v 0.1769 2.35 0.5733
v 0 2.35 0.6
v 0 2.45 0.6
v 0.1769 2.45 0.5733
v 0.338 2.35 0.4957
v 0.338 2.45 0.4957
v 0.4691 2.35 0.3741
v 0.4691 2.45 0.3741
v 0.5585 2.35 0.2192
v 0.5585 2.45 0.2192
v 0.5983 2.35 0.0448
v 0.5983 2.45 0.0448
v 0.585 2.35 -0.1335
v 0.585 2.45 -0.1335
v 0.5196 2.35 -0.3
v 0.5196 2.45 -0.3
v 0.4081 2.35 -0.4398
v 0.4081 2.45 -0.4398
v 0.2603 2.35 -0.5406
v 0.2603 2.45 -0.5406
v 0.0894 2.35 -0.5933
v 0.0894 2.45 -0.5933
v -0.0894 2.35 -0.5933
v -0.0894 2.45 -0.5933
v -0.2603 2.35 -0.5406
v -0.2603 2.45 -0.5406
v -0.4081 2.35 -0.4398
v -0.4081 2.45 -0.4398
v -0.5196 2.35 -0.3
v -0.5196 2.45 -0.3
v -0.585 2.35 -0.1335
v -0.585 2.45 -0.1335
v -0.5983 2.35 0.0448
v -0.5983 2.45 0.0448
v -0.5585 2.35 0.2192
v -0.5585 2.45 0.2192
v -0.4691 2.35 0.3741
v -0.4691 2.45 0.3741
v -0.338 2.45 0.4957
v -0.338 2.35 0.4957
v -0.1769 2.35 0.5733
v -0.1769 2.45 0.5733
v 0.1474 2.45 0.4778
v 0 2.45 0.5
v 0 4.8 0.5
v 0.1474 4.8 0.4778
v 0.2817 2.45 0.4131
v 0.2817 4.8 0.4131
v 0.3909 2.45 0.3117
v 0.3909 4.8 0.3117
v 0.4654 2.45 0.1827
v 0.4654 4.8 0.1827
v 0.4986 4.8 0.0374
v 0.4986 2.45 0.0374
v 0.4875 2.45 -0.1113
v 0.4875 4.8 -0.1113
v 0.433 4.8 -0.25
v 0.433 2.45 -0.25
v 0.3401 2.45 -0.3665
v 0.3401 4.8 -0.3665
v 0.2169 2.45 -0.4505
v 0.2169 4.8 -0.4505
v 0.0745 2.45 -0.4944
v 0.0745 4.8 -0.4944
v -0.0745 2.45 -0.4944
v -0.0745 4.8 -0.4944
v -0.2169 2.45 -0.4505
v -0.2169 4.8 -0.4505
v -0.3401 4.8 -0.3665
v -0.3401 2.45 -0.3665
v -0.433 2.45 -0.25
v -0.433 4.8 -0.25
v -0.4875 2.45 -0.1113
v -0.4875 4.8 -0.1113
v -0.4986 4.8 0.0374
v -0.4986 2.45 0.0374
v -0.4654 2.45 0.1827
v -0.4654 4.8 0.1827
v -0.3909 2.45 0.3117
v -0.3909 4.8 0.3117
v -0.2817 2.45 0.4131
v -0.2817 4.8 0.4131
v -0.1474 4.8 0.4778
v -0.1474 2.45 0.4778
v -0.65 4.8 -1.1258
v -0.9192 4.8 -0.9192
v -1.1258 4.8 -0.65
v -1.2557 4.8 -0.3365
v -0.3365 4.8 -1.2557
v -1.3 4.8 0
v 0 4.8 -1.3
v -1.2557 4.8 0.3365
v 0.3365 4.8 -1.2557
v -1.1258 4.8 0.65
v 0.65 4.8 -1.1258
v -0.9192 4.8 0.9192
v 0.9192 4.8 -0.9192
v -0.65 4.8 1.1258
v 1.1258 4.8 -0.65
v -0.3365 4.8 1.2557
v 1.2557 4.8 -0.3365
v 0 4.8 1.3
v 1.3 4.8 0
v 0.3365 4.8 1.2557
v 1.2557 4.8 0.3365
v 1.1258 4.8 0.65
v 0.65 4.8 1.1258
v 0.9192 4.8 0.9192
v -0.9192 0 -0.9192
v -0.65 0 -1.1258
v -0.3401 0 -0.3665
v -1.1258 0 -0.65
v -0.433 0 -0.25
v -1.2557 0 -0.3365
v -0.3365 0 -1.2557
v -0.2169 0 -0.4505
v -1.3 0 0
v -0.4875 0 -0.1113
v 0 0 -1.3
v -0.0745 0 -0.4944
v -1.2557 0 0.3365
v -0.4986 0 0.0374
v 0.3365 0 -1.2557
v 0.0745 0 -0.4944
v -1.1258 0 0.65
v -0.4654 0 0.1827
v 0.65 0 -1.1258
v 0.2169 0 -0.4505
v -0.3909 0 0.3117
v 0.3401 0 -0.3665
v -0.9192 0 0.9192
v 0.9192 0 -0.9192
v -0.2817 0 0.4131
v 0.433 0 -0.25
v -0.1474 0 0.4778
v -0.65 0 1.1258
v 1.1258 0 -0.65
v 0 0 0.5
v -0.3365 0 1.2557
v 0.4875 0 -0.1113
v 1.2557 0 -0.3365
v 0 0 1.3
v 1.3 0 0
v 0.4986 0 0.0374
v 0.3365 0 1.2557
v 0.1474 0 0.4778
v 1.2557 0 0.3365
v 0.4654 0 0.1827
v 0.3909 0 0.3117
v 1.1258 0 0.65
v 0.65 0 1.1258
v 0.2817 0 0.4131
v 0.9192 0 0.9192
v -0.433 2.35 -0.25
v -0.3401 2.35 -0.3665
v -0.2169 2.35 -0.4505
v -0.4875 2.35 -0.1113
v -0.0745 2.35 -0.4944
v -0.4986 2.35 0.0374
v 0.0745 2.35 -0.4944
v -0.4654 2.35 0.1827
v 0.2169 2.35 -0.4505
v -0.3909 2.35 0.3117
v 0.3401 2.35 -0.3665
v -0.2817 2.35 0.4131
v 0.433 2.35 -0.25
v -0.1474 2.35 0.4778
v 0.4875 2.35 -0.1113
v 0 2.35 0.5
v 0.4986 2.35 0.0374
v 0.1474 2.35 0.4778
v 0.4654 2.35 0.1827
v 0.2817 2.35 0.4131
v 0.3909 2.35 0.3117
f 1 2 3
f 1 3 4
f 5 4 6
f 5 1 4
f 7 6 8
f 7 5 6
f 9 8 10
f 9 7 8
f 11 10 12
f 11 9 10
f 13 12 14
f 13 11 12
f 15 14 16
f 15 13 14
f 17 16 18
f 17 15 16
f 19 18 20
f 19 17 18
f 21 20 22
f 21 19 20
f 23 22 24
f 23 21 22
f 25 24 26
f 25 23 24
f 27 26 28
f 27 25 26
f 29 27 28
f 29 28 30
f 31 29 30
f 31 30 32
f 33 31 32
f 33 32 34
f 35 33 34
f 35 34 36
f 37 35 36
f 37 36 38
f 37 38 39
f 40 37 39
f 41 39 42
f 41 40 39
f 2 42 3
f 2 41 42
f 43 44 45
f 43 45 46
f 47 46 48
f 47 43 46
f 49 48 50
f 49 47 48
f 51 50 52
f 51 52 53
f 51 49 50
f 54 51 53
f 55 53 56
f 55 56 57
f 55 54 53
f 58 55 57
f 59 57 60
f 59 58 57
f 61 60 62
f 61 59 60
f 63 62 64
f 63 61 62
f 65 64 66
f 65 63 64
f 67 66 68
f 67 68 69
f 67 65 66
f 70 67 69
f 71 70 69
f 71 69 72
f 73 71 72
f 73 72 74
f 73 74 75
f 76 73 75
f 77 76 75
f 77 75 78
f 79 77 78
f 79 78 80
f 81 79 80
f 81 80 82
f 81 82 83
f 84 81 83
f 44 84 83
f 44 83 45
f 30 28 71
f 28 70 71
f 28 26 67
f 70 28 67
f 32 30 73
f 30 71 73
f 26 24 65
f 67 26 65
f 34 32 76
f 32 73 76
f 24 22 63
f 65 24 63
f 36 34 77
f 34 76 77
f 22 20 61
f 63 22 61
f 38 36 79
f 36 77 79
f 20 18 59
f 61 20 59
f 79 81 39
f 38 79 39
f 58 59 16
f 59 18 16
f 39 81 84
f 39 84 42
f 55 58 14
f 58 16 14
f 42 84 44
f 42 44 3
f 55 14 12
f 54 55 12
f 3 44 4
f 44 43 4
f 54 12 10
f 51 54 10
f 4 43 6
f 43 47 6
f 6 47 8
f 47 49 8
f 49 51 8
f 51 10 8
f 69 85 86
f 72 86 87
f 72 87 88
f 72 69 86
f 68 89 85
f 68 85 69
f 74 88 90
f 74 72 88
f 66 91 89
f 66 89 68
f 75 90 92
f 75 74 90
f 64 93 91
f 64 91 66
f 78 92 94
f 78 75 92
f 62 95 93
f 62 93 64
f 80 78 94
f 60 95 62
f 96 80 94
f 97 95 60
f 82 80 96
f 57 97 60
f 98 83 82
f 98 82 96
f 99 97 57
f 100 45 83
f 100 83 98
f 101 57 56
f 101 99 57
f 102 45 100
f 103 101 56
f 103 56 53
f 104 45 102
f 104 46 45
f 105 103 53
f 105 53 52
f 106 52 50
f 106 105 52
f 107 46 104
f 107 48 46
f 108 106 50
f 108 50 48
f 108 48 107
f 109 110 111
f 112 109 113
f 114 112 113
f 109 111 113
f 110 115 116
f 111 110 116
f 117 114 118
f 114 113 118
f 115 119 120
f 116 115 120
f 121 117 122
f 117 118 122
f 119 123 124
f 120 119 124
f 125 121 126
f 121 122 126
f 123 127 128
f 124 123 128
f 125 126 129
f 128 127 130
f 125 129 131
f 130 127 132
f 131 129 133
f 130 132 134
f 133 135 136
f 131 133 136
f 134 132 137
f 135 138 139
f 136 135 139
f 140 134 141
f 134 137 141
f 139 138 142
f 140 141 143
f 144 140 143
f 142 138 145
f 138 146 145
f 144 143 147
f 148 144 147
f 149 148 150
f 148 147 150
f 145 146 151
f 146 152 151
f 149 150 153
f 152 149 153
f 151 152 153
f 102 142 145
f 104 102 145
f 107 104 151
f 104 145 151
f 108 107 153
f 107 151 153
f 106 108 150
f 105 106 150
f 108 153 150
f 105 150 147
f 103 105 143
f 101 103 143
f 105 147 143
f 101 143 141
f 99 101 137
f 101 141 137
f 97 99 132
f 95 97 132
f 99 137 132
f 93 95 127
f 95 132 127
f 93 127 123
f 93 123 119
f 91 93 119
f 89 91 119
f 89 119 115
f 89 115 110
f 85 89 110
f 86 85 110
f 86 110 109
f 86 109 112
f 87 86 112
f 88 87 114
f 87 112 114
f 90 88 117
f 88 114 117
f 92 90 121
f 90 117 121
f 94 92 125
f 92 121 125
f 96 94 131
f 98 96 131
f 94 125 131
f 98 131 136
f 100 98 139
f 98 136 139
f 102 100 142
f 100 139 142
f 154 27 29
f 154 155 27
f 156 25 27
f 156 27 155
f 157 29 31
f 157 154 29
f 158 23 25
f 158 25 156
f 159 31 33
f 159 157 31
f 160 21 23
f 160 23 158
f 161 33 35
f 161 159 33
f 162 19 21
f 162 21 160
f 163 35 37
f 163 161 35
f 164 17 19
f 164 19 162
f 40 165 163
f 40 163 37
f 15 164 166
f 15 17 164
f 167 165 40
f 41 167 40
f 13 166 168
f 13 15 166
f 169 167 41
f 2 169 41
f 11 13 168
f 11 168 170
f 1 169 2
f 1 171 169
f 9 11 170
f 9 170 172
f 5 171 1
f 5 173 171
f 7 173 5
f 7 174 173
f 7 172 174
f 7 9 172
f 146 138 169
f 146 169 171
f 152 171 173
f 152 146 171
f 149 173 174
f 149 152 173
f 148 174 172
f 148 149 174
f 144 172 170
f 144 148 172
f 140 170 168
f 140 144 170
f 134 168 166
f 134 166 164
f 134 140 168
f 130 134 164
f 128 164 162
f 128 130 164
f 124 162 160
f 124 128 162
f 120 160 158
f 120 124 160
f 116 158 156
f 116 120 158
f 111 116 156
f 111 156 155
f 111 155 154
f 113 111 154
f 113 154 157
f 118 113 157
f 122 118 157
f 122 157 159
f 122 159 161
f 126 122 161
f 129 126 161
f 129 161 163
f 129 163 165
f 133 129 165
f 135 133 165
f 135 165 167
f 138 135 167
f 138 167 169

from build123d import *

# Parameters (mm, degrees)
SKETCH2_R               = 1.3
SKETCH2_R_2             = 0.5
BOSS_EXTRUDE1_DEPTH     = 4.8
CUT_EXTRUDE1_DEPTH      = 0.05
CUT_EXTRUDE1_DEPTH_BACK = 0.05
SKETCH3_R               = 0.6
SKETCH3_R_2             = 0.5


with BuildPart() as part:
    # Sketch2 → Boss-Extrude1 (new body)
    with BuildSketch(Plane(origin=(0, 0, 0), x_dir=(1, 0, 0), z_dir=(0, 1, 0))):
        with Locations(Location((0, 0, 0), (0, 0, 270))):
            Circle(SKETCH2_R)
        with Locations(Location((0, 0, 0), (0, 0, 270))):
            Circle(SKETCH2_R_2, mode=Mode.SUBTRACT)
    extrude(amount=BOSS_EXTRUDE1_DEPTH)

    # Sketch3 → Cut-Extrude1 (cut, two sides: drawn at the far end of the back side and taken through both)
    with BuildSketch(Plane(origin=(0, 2.4, 0), x_dir=(1, 0, 0), z_dir=(0, 1, 0)).offset(-CUT_EXTRUDE1_DEPTH_BACK)):
        with Locations(Location((0, 0, 0), (0, 0, 270))):
            Circle(SKETCH3_R)
        with Locations(Location((0, 0, 0), (0, 0, 270))):
            Circle(SKETCH3_R_2, mode=Mode.SUBTRACT)
    extrude(amount=CUT_EXTRUDE1_DEPTH + CUT_EXTRUDE1_DEPTH_BACK, mode=Mode.SUBTRACT)


solid = part.part
